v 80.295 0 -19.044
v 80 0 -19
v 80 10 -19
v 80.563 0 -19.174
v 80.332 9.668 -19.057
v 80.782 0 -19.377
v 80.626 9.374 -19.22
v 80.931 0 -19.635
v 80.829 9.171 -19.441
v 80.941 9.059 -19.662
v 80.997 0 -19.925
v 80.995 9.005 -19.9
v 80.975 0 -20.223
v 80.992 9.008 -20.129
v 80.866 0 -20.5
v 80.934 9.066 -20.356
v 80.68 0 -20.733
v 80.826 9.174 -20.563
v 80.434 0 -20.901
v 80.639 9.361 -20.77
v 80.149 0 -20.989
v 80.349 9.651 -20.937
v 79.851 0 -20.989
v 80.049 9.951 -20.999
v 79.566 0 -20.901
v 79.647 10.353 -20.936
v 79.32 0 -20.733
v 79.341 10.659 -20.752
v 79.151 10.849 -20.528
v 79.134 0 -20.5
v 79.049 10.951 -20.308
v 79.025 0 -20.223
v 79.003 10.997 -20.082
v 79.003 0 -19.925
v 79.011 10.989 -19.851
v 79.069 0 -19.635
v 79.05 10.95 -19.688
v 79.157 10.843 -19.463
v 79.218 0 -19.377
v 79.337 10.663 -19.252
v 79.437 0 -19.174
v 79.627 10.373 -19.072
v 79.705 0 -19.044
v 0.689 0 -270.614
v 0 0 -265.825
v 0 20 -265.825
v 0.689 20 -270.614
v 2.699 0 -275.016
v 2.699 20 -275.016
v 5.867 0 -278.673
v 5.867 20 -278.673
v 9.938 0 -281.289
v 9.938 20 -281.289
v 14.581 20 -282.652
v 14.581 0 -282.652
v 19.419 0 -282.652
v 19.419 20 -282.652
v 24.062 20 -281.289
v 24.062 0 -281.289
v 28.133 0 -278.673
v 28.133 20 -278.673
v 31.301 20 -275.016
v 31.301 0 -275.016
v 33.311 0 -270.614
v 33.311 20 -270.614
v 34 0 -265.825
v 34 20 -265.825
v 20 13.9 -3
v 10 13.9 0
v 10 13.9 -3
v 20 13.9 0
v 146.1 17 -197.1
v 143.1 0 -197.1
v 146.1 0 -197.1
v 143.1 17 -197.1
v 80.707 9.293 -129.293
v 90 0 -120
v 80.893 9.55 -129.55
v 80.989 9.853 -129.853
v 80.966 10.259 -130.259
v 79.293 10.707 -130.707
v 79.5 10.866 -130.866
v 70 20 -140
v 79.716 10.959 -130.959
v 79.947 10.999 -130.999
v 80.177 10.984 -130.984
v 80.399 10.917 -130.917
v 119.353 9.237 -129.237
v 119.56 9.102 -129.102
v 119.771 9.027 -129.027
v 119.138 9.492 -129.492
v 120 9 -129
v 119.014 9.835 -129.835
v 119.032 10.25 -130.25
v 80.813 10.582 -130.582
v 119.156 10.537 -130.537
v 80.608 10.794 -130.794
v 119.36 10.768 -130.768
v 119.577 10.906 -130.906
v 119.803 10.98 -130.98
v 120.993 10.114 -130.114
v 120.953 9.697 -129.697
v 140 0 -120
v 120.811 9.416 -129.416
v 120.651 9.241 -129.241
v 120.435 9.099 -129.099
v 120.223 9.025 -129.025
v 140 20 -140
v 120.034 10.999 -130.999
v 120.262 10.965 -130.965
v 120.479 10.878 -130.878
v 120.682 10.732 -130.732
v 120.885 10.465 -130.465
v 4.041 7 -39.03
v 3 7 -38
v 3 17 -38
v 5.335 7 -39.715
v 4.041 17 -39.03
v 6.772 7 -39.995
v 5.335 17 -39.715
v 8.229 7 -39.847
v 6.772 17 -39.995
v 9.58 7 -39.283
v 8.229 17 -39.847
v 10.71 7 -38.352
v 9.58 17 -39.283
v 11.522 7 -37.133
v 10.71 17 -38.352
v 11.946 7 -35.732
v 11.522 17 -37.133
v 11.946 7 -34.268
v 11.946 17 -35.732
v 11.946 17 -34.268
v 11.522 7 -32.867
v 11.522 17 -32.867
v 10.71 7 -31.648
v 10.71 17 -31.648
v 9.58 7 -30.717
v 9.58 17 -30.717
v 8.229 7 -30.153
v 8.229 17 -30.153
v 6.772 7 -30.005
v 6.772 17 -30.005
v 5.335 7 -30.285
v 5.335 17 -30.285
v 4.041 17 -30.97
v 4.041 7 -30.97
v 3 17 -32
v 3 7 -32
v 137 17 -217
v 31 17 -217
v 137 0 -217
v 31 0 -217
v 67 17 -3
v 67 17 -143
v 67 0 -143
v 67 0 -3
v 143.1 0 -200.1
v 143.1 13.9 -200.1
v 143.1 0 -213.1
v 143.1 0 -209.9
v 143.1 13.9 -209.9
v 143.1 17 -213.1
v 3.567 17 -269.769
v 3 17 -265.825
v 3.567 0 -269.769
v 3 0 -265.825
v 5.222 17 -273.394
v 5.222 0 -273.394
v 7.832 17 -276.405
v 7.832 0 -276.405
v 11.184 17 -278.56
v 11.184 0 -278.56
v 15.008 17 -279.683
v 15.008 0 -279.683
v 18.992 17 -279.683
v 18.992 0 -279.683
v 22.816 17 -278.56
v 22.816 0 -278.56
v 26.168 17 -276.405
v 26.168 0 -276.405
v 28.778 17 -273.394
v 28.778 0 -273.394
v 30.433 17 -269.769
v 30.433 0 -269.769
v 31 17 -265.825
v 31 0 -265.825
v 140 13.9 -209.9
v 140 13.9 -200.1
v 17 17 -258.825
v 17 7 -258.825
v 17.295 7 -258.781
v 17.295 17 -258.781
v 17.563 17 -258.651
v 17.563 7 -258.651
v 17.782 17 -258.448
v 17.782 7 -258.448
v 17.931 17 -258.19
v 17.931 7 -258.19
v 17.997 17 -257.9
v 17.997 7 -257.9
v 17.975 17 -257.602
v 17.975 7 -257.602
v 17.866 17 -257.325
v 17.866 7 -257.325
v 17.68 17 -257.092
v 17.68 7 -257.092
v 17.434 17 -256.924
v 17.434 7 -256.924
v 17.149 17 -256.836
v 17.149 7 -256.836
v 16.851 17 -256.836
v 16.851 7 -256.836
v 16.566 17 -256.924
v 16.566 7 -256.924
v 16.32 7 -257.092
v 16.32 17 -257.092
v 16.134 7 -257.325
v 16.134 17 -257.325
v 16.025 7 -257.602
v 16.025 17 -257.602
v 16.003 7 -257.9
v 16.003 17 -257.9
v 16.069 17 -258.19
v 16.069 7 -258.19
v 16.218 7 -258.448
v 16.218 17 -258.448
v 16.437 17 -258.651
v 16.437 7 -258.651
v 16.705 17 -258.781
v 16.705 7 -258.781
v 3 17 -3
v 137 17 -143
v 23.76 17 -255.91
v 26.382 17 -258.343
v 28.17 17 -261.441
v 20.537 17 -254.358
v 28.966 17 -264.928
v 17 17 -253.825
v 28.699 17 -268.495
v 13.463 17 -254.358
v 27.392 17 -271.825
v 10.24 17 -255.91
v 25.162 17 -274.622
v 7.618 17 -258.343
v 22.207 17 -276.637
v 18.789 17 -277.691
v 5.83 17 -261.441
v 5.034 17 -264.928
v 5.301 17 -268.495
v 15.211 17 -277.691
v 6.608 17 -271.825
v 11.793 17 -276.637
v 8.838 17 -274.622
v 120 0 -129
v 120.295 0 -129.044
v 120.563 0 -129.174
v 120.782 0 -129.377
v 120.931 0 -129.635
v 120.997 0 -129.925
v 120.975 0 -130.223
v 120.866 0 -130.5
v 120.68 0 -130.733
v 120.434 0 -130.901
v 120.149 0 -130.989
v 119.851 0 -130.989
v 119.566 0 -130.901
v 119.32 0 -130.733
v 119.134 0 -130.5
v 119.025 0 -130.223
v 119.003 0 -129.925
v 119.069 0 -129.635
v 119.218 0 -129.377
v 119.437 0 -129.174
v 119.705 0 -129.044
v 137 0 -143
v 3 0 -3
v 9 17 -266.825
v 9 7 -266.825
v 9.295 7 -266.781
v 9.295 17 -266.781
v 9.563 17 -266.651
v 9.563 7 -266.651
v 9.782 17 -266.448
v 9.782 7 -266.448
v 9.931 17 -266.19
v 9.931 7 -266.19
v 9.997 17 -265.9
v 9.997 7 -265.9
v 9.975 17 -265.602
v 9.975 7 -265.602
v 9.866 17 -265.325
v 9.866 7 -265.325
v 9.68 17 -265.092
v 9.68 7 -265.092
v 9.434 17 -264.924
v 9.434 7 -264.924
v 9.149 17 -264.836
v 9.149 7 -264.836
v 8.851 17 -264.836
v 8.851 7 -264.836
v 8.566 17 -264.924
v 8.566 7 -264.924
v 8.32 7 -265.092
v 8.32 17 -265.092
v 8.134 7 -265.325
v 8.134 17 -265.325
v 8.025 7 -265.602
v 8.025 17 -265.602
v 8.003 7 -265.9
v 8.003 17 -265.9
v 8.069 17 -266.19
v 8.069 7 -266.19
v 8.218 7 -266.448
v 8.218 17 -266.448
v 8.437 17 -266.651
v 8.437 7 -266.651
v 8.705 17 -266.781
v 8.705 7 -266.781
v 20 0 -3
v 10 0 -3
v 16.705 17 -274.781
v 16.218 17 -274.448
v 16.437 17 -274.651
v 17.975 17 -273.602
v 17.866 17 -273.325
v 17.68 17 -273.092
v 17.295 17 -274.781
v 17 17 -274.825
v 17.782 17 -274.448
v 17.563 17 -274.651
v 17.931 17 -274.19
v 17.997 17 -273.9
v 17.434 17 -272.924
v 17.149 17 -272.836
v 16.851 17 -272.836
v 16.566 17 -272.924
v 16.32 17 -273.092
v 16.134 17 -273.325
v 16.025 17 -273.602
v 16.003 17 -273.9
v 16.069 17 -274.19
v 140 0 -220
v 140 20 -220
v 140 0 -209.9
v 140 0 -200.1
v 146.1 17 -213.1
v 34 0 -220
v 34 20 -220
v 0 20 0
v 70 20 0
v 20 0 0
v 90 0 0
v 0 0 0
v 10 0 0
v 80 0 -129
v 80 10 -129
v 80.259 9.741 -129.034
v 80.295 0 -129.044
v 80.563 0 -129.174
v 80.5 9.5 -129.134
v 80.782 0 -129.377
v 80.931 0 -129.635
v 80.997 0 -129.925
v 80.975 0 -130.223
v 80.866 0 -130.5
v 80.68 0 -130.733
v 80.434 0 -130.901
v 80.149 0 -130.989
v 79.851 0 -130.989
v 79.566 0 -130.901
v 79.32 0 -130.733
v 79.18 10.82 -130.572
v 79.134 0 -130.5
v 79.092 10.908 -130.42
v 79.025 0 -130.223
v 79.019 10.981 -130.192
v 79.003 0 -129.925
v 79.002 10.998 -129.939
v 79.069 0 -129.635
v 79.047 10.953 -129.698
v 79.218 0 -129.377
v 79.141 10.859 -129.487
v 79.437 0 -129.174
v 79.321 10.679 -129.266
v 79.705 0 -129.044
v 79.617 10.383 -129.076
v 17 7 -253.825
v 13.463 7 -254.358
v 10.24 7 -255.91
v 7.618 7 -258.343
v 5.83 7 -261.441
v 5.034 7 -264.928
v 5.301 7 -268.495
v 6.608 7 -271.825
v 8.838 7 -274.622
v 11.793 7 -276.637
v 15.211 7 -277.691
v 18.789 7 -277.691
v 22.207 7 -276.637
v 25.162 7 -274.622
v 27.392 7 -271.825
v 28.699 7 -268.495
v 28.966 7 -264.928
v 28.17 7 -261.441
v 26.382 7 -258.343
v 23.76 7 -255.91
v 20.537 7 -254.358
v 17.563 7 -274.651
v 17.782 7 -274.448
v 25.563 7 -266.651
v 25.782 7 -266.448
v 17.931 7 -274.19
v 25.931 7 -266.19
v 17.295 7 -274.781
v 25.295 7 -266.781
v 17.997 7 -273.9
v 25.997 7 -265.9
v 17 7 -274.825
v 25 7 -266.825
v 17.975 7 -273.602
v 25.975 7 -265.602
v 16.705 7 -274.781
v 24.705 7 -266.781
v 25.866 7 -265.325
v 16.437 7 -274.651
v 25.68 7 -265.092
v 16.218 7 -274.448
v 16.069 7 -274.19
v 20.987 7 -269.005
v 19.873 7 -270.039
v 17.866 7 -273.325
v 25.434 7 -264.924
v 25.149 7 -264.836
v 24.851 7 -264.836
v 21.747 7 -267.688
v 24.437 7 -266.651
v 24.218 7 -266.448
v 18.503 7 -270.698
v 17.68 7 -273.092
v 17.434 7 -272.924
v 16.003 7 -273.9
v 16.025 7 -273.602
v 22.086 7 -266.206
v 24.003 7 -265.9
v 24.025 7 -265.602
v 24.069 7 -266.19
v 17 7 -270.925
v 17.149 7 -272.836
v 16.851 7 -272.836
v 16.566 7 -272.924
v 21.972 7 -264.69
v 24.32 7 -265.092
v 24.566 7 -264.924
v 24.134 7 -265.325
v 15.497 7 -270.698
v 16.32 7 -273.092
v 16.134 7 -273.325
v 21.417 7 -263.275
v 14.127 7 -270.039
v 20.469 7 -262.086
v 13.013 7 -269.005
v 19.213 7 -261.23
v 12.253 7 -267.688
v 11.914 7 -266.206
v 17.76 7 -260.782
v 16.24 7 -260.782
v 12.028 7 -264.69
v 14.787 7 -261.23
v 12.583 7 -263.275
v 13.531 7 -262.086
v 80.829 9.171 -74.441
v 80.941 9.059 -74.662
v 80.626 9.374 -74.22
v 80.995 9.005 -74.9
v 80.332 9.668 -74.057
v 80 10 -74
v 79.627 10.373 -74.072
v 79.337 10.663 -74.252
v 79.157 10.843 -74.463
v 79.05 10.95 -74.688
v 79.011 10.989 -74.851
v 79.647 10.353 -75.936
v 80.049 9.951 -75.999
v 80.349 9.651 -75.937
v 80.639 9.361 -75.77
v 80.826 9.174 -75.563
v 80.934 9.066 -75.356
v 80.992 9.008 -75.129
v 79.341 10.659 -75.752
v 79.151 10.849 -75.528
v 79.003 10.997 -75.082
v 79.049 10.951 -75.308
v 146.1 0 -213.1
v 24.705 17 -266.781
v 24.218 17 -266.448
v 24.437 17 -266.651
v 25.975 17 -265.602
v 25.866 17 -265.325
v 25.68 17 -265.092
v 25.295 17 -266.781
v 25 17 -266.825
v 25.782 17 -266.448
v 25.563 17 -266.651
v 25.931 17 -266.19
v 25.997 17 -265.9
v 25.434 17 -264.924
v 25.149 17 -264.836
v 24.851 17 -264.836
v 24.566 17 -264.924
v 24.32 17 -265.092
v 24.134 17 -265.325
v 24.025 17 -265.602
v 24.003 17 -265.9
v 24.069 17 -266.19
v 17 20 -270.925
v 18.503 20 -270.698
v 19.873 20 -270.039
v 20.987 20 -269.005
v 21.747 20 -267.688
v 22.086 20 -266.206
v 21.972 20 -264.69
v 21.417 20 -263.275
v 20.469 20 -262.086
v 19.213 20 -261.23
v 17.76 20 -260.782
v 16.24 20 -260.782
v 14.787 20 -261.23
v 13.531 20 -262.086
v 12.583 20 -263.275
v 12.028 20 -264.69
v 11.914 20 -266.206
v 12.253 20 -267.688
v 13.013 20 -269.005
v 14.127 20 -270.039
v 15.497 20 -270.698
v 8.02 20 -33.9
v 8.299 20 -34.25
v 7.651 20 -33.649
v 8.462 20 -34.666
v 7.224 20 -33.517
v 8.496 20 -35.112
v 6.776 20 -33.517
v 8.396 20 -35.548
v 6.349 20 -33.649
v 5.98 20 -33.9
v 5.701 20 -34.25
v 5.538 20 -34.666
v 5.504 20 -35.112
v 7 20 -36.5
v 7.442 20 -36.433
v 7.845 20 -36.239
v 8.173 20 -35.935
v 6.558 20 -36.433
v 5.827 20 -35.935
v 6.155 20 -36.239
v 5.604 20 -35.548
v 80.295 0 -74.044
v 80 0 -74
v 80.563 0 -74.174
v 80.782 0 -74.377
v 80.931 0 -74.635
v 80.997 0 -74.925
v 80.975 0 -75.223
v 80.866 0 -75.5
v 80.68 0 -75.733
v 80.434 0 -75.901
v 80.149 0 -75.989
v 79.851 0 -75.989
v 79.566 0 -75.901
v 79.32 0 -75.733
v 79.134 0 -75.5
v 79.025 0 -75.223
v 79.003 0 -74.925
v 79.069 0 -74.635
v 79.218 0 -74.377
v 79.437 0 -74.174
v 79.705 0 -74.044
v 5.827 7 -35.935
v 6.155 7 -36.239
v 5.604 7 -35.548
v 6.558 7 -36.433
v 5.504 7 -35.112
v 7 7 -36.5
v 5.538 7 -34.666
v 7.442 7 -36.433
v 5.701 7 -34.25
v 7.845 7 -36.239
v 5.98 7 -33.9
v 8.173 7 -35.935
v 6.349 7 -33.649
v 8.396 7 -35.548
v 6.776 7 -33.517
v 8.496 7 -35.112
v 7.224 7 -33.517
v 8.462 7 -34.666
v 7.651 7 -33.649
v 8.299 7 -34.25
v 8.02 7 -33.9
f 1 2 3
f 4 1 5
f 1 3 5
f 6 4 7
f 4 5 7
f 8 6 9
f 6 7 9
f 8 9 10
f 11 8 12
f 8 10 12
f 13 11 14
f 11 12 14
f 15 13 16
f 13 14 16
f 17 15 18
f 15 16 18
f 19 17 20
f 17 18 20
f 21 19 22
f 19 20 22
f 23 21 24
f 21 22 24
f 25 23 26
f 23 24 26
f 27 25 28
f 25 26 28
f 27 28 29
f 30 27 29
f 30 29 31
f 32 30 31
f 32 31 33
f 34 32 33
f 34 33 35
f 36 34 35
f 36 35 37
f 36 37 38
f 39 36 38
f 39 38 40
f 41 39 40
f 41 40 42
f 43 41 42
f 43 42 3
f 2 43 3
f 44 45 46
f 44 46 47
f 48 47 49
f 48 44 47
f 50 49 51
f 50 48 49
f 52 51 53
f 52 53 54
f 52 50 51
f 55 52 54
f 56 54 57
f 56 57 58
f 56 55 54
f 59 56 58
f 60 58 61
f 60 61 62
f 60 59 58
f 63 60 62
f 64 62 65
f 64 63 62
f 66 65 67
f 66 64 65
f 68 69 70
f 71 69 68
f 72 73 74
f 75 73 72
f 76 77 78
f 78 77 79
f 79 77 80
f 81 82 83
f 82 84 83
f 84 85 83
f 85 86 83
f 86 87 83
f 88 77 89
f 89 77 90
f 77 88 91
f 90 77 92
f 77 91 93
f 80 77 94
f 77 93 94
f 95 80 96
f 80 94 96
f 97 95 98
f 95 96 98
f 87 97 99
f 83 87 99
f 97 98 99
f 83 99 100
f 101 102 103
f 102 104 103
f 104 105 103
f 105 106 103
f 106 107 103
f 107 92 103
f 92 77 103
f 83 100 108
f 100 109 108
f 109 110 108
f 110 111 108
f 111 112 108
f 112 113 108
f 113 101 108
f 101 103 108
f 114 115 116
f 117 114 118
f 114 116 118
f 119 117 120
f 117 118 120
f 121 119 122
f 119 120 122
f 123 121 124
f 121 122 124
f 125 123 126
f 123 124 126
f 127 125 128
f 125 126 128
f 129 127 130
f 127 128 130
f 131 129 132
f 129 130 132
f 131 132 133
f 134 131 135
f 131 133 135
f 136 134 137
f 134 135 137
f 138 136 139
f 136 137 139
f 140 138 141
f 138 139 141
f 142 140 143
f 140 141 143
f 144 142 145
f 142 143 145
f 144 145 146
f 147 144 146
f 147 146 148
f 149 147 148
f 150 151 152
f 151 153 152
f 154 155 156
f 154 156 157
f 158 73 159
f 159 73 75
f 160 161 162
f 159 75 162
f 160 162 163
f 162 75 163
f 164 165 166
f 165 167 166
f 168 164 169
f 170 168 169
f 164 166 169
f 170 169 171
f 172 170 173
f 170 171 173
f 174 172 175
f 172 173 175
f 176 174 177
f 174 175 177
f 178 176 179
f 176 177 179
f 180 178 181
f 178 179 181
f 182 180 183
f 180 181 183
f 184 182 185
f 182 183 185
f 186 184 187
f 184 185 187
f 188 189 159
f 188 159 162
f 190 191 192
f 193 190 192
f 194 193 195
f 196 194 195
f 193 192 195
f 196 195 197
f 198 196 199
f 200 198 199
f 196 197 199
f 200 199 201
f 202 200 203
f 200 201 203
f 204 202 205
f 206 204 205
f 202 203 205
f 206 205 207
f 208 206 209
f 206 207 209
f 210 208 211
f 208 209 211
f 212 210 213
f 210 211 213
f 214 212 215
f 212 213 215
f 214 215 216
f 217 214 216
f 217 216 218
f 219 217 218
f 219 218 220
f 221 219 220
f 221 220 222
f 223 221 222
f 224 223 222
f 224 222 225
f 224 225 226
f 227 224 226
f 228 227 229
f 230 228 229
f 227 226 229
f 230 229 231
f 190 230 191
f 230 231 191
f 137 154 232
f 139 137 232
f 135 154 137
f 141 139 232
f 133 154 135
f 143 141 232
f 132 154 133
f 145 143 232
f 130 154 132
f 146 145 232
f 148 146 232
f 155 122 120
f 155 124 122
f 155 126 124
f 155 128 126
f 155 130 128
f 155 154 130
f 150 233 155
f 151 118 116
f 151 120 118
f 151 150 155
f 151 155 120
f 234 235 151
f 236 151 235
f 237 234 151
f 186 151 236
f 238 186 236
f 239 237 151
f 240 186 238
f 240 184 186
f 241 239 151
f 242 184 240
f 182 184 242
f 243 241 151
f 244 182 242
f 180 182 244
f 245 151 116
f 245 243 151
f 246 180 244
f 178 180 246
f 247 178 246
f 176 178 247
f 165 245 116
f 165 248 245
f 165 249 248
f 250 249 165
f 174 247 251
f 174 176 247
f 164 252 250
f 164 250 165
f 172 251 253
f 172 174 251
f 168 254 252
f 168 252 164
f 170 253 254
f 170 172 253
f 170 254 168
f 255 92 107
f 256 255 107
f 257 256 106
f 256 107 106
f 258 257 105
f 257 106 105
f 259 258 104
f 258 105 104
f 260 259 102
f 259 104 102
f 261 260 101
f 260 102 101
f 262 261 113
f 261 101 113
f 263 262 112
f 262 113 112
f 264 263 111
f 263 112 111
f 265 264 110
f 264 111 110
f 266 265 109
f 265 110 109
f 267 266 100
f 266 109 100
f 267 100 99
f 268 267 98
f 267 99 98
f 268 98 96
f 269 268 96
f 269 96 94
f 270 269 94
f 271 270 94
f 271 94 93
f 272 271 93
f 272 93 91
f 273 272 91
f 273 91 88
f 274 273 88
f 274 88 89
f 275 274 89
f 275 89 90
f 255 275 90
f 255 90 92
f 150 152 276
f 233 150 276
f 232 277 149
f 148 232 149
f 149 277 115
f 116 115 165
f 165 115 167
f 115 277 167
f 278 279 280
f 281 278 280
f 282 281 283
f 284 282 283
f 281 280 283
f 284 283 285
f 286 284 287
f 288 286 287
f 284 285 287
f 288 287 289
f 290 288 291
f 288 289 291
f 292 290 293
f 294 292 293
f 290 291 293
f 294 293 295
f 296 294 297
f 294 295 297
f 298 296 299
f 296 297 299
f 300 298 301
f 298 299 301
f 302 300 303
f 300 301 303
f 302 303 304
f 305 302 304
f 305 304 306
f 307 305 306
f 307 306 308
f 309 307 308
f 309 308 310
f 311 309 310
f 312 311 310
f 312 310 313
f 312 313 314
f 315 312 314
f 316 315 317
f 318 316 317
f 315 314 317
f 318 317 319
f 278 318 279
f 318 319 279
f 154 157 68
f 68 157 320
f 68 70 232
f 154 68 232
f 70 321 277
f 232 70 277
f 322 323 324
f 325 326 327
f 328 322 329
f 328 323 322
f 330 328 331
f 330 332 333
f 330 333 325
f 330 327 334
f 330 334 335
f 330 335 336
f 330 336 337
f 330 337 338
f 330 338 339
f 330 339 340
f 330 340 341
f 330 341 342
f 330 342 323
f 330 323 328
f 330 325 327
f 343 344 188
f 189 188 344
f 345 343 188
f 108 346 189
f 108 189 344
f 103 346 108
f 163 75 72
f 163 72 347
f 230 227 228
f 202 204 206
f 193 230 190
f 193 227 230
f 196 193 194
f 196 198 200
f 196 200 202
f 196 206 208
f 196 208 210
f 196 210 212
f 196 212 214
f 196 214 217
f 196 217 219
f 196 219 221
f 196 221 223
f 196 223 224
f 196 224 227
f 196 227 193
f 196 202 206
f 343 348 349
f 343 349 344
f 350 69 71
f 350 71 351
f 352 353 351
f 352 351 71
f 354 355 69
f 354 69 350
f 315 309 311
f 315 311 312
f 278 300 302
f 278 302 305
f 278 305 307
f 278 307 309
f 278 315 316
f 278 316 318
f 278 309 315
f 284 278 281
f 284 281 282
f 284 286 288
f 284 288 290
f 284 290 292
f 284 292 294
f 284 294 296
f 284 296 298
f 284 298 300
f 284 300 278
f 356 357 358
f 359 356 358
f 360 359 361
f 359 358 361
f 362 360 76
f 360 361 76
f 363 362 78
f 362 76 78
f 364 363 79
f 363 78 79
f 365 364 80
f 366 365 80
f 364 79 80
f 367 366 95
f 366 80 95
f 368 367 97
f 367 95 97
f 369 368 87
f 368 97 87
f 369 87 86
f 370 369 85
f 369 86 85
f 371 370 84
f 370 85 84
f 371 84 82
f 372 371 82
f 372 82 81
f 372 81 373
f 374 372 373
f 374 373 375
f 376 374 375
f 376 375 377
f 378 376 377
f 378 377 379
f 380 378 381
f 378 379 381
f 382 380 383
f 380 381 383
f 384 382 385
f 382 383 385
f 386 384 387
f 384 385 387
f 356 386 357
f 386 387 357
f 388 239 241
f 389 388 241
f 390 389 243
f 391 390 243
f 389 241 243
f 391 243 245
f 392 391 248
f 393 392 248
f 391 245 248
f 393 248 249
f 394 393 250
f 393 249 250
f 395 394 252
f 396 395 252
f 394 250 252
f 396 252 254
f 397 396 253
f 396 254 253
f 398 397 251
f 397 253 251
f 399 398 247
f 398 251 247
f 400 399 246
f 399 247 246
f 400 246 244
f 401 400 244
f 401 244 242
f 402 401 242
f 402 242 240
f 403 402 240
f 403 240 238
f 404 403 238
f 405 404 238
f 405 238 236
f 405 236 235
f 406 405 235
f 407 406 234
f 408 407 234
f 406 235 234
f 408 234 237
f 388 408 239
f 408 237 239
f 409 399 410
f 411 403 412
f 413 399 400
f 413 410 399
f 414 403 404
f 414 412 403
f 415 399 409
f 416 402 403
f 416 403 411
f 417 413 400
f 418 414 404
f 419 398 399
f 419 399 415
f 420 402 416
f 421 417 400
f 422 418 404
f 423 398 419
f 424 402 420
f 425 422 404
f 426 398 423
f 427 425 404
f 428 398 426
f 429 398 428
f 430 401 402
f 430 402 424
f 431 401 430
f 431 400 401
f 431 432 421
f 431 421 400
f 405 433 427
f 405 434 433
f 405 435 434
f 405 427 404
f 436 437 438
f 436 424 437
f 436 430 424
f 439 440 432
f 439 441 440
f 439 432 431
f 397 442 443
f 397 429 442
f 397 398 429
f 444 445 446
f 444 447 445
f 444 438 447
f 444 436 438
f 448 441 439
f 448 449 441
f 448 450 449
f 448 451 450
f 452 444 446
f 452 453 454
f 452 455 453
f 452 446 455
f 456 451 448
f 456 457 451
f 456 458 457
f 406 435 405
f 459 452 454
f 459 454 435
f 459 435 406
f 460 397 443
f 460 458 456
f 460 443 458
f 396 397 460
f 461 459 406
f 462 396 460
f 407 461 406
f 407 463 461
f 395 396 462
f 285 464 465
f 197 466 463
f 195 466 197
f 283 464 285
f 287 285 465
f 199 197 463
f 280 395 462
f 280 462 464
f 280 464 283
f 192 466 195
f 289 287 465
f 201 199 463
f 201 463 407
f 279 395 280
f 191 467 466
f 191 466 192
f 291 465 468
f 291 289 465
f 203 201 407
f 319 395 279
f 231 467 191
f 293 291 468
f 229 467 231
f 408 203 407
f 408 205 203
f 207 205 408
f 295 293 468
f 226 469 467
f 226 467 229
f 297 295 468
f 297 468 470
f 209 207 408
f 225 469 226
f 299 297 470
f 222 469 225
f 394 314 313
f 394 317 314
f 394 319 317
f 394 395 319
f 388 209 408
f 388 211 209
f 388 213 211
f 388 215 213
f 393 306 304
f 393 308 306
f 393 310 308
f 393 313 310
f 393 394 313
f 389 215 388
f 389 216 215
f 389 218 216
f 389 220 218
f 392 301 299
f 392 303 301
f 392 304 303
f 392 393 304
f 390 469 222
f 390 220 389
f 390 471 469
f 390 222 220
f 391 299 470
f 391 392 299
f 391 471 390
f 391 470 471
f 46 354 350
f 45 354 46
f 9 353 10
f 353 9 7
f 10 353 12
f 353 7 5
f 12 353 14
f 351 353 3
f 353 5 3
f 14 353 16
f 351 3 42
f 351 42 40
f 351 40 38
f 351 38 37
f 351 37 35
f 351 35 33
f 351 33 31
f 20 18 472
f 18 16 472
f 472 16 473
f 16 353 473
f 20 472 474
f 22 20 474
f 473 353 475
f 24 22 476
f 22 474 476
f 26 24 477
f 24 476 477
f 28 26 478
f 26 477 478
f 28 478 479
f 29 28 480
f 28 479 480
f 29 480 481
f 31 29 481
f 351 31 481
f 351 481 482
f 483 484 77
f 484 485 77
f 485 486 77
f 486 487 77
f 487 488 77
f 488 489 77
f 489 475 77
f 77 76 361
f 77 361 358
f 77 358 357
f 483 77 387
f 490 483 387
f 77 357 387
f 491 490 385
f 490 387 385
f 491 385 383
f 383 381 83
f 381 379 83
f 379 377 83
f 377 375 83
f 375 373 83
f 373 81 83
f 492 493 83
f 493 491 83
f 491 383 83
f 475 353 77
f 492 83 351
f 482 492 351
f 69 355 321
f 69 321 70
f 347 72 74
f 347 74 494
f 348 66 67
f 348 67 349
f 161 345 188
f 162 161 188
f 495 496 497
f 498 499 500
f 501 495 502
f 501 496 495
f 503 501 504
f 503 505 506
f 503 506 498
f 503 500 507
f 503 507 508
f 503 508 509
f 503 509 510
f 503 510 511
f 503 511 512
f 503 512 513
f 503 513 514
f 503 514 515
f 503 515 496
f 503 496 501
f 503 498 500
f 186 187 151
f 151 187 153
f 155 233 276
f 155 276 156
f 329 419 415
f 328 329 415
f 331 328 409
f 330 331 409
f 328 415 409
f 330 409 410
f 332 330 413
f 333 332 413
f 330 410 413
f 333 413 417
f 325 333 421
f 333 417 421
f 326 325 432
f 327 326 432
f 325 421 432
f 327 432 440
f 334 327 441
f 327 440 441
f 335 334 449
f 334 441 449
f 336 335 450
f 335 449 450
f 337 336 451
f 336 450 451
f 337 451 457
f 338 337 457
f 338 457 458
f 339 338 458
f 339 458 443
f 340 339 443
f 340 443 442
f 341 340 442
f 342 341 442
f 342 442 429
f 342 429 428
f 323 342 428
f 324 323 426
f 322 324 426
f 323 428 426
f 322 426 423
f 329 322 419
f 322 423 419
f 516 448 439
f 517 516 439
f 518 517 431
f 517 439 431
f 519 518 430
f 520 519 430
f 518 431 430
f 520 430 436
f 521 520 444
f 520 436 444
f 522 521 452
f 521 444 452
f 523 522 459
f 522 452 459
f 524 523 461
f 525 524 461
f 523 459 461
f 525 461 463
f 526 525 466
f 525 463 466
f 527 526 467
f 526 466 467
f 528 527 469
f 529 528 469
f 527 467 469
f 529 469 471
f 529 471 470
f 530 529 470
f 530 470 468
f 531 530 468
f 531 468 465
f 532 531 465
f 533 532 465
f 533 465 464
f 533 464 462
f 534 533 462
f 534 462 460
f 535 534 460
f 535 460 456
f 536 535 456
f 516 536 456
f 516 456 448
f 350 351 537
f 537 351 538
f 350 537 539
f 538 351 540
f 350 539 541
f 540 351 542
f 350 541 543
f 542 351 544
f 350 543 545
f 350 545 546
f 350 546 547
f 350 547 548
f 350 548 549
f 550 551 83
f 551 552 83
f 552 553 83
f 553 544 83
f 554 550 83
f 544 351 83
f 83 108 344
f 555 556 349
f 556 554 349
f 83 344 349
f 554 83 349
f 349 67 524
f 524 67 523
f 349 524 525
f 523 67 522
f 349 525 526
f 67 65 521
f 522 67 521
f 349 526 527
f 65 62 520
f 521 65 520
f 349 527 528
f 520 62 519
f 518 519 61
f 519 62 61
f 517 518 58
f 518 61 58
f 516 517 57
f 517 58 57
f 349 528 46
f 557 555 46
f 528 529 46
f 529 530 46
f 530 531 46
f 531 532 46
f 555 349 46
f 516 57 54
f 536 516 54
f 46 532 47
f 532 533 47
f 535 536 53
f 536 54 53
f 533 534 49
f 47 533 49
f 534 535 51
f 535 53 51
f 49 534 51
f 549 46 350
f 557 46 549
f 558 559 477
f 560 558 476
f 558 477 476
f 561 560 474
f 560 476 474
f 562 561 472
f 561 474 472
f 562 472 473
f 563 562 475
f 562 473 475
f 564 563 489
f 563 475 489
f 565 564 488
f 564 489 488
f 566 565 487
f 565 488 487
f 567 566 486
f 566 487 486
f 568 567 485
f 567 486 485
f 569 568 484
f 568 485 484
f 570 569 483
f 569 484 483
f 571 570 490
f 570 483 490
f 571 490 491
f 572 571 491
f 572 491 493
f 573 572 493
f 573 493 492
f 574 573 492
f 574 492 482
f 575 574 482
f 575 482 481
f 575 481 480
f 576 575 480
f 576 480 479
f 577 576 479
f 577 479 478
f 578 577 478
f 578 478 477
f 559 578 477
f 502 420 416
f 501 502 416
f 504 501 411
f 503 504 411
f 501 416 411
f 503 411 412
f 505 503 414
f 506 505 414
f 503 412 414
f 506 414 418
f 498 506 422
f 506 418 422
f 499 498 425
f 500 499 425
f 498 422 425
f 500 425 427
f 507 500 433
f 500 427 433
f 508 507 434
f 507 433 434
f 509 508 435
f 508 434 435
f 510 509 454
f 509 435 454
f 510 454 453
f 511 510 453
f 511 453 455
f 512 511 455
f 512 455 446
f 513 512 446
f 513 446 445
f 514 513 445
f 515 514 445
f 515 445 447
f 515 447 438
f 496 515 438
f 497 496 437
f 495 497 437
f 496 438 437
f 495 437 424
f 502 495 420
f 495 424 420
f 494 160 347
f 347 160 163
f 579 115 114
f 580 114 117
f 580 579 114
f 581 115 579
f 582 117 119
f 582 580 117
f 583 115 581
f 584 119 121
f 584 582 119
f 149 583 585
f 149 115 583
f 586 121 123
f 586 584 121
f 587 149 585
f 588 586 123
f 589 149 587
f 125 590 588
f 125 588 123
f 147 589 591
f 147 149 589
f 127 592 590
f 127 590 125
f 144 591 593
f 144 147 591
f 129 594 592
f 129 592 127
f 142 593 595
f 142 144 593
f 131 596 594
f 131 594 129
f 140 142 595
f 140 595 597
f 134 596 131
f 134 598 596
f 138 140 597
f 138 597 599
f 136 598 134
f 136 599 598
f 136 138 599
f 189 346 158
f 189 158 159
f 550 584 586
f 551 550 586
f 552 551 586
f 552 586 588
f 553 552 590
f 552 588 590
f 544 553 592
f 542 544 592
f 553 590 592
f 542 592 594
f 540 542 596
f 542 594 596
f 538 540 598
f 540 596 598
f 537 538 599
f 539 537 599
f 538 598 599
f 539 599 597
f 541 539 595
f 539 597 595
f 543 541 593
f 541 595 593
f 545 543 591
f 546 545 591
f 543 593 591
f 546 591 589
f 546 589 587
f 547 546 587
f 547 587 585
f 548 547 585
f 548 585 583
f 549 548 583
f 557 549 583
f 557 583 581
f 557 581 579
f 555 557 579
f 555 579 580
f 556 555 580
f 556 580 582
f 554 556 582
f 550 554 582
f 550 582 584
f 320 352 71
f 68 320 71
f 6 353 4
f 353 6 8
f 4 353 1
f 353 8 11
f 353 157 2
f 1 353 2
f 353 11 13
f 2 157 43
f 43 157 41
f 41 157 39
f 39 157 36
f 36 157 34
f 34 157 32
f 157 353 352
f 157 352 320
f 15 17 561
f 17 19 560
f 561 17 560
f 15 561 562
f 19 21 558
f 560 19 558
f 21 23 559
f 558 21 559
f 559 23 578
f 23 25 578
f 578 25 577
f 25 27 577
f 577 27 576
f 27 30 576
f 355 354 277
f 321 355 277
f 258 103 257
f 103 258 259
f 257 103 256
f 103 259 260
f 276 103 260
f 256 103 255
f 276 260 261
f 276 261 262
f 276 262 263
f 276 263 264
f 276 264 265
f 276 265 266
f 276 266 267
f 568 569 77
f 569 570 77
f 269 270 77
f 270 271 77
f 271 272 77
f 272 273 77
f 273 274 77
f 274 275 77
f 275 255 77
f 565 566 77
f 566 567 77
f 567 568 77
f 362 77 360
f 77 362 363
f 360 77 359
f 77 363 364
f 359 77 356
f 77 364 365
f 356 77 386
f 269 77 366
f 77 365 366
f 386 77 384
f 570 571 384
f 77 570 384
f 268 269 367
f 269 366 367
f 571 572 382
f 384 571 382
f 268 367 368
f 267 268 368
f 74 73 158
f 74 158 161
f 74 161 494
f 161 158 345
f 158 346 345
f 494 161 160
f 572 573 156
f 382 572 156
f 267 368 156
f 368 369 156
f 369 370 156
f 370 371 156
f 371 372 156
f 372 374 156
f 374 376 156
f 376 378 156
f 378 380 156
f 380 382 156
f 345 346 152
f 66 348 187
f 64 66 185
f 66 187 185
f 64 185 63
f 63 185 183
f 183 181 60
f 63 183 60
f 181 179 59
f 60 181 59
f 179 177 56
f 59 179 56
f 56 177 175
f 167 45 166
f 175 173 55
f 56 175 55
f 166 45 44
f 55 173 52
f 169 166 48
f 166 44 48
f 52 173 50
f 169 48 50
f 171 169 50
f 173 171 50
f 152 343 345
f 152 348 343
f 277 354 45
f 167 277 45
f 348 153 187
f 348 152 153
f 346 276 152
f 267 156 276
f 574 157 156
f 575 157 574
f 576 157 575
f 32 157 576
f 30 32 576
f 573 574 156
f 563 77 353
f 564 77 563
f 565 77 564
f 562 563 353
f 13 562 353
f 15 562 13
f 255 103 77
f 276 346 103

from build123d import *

# Parameters (mm, degrees)
CORNERBOSS_EXTRUDE1_DEPTH               = 20
SHELL2_T                                = -3
PUTBACKSHELLBOSS_EXTRUDE1_DEPTH         = 17
TAB_HOLES_SKETCH1_R                     = 1
TABHOLESCUT_EXTRUDE1_DEPTH              = 317.211923597
PADSKETCH3_R                            = 12
PADSKETCH3_R_2                          = 5
PADBOSS_EXTRUDE2_DEPTH                  = 10
STEPPERSHAFTHOLESKETCH4_R               = 5.1
STEPPERSHAFTHOLESKETCH4_R_2             = 1.5
STEPPERSHAFTCUT_EXTRUDE2_DEPTH          = 316.846451025
THREADEDNUTMOUNTHOLESSKETCH5_R          = 1
THREADEDNUTMOUNTHOLESCUT_EXTRUDE4_DEPTH = 10
TRPEGSKETCH1_W                          = 9.8
TRPEGSKETCH1_H                          = 13.9
TRPEGBOSS_EXTRUDE1_DEPTH                = 3.1
TRPEGCAPSKETCH2_W                       = 16
TRPEGCAPSKETCH2_H                       = 17
TRPEGCAPBOSS_EXTRUDE2_DEPTH             = 3
BOTTOMPEGHOLESKETCH3_W                  = 10
BOTTOMPEGHOLESKETCH3_H                  = 13.9
BOTTOMPEGHOLECUT_EXTRUDE1_DEPTH         = 3


with BuildPart() as part:
    # CornerrSketch1 → CornerBoss-Extrude1 (new body)
    with BuildSketch(Plane(origin=(0, 0, 0), x_dir=(1, 0, 0), z_dir=(0, 1, 0))):
        with BuildLine():
            Line((140, 220), (140, 120))
            Line((140, 120), (90, 120))
            Line((90, 120), (90, 0))
            Line((90, 0), (0, 0))
            Line((0, 0), (0, 265.825))
            ThreePointArc((0, 265.825), (17, 282.825), (34, 265.825))
            Line((34, 265.825), (34, 220))
            Line((34, 220), (140, 220))
        make_face()
    extrude(amount=CORNERBOSS_EXTRUDE1_DEPTH)

    # Shell2
    shell2_openings = [part.faces().sort_by_distance(p)[0] for p in [
        (55.952693014, 0, -131.673048366),
    ]]
    offset(amount=SHELL2_T, openings=shell2_openings, kind=Kind.INTERSECTION)

    # PutBackShellSketch2 → PutBackShellBoss-Extrude1 (add)
    with BuildSketch(Plane.XZ.offset(-17)):
        Polygon((67, -3), (87, -3), (87, -123), (137, -123), (137, -143), (67, -143), align=None)
    extrude(amount=PUTBACKSHELLBOSS_EXTRUDE1_DEPTH)

    # Tab holes-Sketch1 → TabHolesCut-Extrude1 (cut, through all)
    with BuildSketch(Plane(origin=(0, 20, 0), x_dir=(1, 0, 0), z_dir=(0, 1, 0))):
        with Locations(Location((120, 130, 0), (0, 0, 270))):
            Circle(TAB_HOLES_SKETCH1_R)
        with Locations(Location((80, 130, 0), (0, 0, 270))):
            Circle(TAB_HOLES_SKETCH1_R)
        with Locations(Location((80, 75, 0), (0, 0, 270))):
            Circle(TAB_HOLES_SKETCH1_R)
        with Locations(Location((80, 20, 0), (0, 0, 270))):
            Circle(TAB_HOLES_SKETCH1_R)
    extrude(amount=-TABHOLESCUT_EXTRUDE1_DEPTH, mode=Mode.SUBTRACT)

    # PadSketch3 → PadBoss-Extrude2 (add)
    with BuildSketch(Plane.XZ.offset(-17)):
        with Locations(Location((17, -265.825, 0), (0, 0, 90))):
            Circle(PADSKETCH3_R)
        with Locations((7, -35)):
            Circle(PADSKETCH3_R_2)
    extrude(amount=PADBOSS_EXTRUDE2_DEPTH)

    # StepperShaftHoleSketch4 → StepperShaftCut-Extrude2 (cut, through all)
    with BuildSketch(Plane.XZ.offset(-7)):
        with Locations(Location((17, -265.825, 0), (0, 0, 270))):
            Circle(STEPPERSHAFTHOLESKETCH4_R)
        with Locations(Location((7, -35, 0), (0, 0, 270))):
            Circle(STEPPERSHAFTHOLESKETCH4_R_2)
    extrude(amount=-STEPPERSHAFTCUT_EXTRUDE2_DEPTH, mode=Mode.SUBTRACT)

    # ThreadedNutMountHolesSketch5 → ThreadedNutMountHolesCut-Extrude4 (cut)
    with BuildSketch(Plane(origin=(0, 7, 0), x_dir=(-1, 0, 0), z_dir=(0, -1, 0))):
        with Locations(Location((-17, 273.825, 0), (0, 0, 90))):
            Circle(THREADEDNUTMOUNTHOLESSKETCH5_R)
        with Locations(Location((-9, 265.825, 0), (0, 0, 90))):
            Circle(THREADEDNUTMOUNTHOLESSKETCH5_R)
        with Locations(Location((-17, 257.825, 0), (0, 0, 90))):
            Circle(THREADEDNUTMOUNTHOLESSKETCH5_R)
        with Locations(Location((-25, 265.825, 0), (0, 0, 90))):
            Circle(THREADEDNUTMOUNTHOLESSKETCH5_R)
    extrude(amount=-THREADEDNUTMOUNTHOLESCUT_EXTRUDE4_DEPTH, mode=Mode.SUBTRACT)

    # TRPegSketch1 → TRPegBoss-Extrude1 (add)
    with BuildSketch(Plane(origin=(140, 0, 0), x_dir=(0, 0, -1), z_dir=(1, 0, 0))):
        with Locations((205, 6.95)):
            Rectangle(TRPEGSKETCH1_W, TRPEGSKETCH1_H)
    extrude(amount=TRPEGBOSS_EXTRUDE1_DEPTH)

    # TRPegCapSketch2 → TRPegCapBoss-Extrude2 (add)
    with BuildSketch(Plane(origin=(143.1, 0, 0), x_dir=(0, 0, -1), z_dir=(1, 0, 0))):
        with Locations((205.1, 8.5)):
            Rectangle(TRPEGCAPSKETCH2_W, TRPEGCAPSKETCH2_H)
    extrude(amount=TRPEGCAPBOSS_EXTRUDE2_DEPTH)

    # BottomPegHoleSketch3 → BottomPegHoleCut-Extrude1 (cut)
    with BuildSketch(Plane.XY):
        with Locations((15, 6.95)):
            Rectangle(BOTTOMPEGHOLESKETCH3_W, BOTTOMPEGHOLESKETCH3_H)
    extrude(amount=-BOTTOMPEGHOLECUT_EXTRUDE1_DEPTH, mode=Mode.SUBTRACT)

    # OverlapChamfer1
    # the kernel refuses this chamfer: 20 mm, written as the material it takes off along each edge
    with BuildSketch(Plane(origin=(90, 20, -120), x_dir=(0.027495876610586317, -0.9996219169112968, 0), z_dir=(0, 0, 1))) as overlapchamfer1_piece_1:
        with BuildLine():
            Line((20.573463904, 0), (-1.130943098, -20.54235587))
            Line((-1.130943098, -20.54235587), (-1.530791864, -20.53135752))
            ThreePointArc((-1.530791864, -20.53135752), (-0.682584541, -10.267956593), (-0.399848767, 0.010998351))
            Line((-0.399848767, 0.010998351), (0.010998351, 0.399848767))
            ThreePointArc((0.010998351, 0.399848767), (10.289953294, 0.117112992), (20.584462254, 0.399848767))
            Line((20.584462254, 0.399848767), (20.573463904, 0))
        make_face()
    extrude(amount=120, mode=Mode.SUBTRACT)
    with BuildSketch(Plane(origin=(140, 20, -120), x_dir=(0, -0.9996219169112968, 0.027495876610586317), z_dir=(-1, 0, 0))) as overlapchamfer1_piece_2:
        with BuildLine():
            Line((20.573463904, 0), (-1.130943098, -20.54235587))
            Line((-1.130943098, -20.54235587), (-1.530791864, -20.53135752))
            ThreePointArc((-1.530791864, -20.53135752), (-0.682584541, -10.267956593), (-0.399848767, 0.010998351))
            Line((-0.399848767, 0.010998351), (0.010998351, 0.399848767))
            ThreePointArc((0.010998351, 0.399848767), (10.289953294, 0.117112992), (20.584462254, 0.399848767))
            Line((20.584462254, 0.399848767), (20.573463904, 0))
        make_face()
    extrude(amount=50, mode=Mode.SUBTRACT)
    with BuildSketch(Plane(origin=(90, 20, -171.433659759), x_dir=(0.027495876610586317, -0.9996219169112968, 0), z_dir=(0, 0, 1))) as overlapchamfer1_piece_3a_section:
        with BuildLine():
            Line((20.573463904, 0), (-1.130943098, -20.54235587))
            Line((-1.130943098, -20.54235587), (-1.530791864, -20.53135752))
            ThreePointArc((-1.530791864, -20.53135752), (-0.682584541, -10.267956593), (-0.399848767, 0.010998351))
            Line((-0.399848767, 0.010998351), (0.010998351, 0.399848767))
            ThreePointArc((0.010998351, 0.399848767), (10.289953294, 0.117112992), (20.584462254, 0.399848767))
            Line((20.584462254, 0.399848767), (20.573463904, 0))
        make_face()
    overlapchamfer1_piece_3a = extrude(amount=171.433659759, mode=Mode.PRIVATE)
    overlapchamfer1_piece_3a = split(overlapchamfer1_piece_3a, bisect_by=Plane(origin=(83.404127464, 13.404127464, -120), z_dir=(0, 0, -1)), keep=Keep.TOP, mode=Mode.PRIVATE)
    with BuildSketch(Plane(origin=(140, 20, -120), x_dir=(0, -0.9996219169112968, 0.027495876610586317), z_dir=(-1, 0, 0))) as overlapchamfer1_piece_3b_section:
        with BuildLine():
            Line((20.573463904, 0), (-1.130943098, -20.54235587))
            Line((-1.130943098, -20.54235587), (-1.530791864, -20.53135752))
            ThreePointArc((-1.530791864, -20.53135752), (-0.682584541, -10.267956593), (-0.399848767, 0.010998351))
            Line((-0.399848767, 0.010998351), (0.010998351, 0.399848767))
            ThreePointArc((0.010998351, 0.399848767), (10.289953294, 0.117112992), (20.584462254, 0.399848767))
            Line((20.584462254, 0.399848767), (20.573463904, 0))
        make_face()
    overlapchamfer1_piece_3b = extrude(amount=101.433659759, mode=Mode.PRIVATE)
    overlapchamfer1_piece_3b = split(overlapchamfer1_piece_3b, bisect_by=Plane(origin=(90, 13.404127464, -126.595872536), z_dir=(-1, 0, 0)), keep=Keep.TOP, mode=Mode.PRIVATE)
    overlapchamfer1_piece_3 = overlapchamfer1_piece_3a & overlapchamfer1_piece_3b
    add(overlapchamfer1_piece_3, mode=Mode.SUBTRACT)


solid = part.part
